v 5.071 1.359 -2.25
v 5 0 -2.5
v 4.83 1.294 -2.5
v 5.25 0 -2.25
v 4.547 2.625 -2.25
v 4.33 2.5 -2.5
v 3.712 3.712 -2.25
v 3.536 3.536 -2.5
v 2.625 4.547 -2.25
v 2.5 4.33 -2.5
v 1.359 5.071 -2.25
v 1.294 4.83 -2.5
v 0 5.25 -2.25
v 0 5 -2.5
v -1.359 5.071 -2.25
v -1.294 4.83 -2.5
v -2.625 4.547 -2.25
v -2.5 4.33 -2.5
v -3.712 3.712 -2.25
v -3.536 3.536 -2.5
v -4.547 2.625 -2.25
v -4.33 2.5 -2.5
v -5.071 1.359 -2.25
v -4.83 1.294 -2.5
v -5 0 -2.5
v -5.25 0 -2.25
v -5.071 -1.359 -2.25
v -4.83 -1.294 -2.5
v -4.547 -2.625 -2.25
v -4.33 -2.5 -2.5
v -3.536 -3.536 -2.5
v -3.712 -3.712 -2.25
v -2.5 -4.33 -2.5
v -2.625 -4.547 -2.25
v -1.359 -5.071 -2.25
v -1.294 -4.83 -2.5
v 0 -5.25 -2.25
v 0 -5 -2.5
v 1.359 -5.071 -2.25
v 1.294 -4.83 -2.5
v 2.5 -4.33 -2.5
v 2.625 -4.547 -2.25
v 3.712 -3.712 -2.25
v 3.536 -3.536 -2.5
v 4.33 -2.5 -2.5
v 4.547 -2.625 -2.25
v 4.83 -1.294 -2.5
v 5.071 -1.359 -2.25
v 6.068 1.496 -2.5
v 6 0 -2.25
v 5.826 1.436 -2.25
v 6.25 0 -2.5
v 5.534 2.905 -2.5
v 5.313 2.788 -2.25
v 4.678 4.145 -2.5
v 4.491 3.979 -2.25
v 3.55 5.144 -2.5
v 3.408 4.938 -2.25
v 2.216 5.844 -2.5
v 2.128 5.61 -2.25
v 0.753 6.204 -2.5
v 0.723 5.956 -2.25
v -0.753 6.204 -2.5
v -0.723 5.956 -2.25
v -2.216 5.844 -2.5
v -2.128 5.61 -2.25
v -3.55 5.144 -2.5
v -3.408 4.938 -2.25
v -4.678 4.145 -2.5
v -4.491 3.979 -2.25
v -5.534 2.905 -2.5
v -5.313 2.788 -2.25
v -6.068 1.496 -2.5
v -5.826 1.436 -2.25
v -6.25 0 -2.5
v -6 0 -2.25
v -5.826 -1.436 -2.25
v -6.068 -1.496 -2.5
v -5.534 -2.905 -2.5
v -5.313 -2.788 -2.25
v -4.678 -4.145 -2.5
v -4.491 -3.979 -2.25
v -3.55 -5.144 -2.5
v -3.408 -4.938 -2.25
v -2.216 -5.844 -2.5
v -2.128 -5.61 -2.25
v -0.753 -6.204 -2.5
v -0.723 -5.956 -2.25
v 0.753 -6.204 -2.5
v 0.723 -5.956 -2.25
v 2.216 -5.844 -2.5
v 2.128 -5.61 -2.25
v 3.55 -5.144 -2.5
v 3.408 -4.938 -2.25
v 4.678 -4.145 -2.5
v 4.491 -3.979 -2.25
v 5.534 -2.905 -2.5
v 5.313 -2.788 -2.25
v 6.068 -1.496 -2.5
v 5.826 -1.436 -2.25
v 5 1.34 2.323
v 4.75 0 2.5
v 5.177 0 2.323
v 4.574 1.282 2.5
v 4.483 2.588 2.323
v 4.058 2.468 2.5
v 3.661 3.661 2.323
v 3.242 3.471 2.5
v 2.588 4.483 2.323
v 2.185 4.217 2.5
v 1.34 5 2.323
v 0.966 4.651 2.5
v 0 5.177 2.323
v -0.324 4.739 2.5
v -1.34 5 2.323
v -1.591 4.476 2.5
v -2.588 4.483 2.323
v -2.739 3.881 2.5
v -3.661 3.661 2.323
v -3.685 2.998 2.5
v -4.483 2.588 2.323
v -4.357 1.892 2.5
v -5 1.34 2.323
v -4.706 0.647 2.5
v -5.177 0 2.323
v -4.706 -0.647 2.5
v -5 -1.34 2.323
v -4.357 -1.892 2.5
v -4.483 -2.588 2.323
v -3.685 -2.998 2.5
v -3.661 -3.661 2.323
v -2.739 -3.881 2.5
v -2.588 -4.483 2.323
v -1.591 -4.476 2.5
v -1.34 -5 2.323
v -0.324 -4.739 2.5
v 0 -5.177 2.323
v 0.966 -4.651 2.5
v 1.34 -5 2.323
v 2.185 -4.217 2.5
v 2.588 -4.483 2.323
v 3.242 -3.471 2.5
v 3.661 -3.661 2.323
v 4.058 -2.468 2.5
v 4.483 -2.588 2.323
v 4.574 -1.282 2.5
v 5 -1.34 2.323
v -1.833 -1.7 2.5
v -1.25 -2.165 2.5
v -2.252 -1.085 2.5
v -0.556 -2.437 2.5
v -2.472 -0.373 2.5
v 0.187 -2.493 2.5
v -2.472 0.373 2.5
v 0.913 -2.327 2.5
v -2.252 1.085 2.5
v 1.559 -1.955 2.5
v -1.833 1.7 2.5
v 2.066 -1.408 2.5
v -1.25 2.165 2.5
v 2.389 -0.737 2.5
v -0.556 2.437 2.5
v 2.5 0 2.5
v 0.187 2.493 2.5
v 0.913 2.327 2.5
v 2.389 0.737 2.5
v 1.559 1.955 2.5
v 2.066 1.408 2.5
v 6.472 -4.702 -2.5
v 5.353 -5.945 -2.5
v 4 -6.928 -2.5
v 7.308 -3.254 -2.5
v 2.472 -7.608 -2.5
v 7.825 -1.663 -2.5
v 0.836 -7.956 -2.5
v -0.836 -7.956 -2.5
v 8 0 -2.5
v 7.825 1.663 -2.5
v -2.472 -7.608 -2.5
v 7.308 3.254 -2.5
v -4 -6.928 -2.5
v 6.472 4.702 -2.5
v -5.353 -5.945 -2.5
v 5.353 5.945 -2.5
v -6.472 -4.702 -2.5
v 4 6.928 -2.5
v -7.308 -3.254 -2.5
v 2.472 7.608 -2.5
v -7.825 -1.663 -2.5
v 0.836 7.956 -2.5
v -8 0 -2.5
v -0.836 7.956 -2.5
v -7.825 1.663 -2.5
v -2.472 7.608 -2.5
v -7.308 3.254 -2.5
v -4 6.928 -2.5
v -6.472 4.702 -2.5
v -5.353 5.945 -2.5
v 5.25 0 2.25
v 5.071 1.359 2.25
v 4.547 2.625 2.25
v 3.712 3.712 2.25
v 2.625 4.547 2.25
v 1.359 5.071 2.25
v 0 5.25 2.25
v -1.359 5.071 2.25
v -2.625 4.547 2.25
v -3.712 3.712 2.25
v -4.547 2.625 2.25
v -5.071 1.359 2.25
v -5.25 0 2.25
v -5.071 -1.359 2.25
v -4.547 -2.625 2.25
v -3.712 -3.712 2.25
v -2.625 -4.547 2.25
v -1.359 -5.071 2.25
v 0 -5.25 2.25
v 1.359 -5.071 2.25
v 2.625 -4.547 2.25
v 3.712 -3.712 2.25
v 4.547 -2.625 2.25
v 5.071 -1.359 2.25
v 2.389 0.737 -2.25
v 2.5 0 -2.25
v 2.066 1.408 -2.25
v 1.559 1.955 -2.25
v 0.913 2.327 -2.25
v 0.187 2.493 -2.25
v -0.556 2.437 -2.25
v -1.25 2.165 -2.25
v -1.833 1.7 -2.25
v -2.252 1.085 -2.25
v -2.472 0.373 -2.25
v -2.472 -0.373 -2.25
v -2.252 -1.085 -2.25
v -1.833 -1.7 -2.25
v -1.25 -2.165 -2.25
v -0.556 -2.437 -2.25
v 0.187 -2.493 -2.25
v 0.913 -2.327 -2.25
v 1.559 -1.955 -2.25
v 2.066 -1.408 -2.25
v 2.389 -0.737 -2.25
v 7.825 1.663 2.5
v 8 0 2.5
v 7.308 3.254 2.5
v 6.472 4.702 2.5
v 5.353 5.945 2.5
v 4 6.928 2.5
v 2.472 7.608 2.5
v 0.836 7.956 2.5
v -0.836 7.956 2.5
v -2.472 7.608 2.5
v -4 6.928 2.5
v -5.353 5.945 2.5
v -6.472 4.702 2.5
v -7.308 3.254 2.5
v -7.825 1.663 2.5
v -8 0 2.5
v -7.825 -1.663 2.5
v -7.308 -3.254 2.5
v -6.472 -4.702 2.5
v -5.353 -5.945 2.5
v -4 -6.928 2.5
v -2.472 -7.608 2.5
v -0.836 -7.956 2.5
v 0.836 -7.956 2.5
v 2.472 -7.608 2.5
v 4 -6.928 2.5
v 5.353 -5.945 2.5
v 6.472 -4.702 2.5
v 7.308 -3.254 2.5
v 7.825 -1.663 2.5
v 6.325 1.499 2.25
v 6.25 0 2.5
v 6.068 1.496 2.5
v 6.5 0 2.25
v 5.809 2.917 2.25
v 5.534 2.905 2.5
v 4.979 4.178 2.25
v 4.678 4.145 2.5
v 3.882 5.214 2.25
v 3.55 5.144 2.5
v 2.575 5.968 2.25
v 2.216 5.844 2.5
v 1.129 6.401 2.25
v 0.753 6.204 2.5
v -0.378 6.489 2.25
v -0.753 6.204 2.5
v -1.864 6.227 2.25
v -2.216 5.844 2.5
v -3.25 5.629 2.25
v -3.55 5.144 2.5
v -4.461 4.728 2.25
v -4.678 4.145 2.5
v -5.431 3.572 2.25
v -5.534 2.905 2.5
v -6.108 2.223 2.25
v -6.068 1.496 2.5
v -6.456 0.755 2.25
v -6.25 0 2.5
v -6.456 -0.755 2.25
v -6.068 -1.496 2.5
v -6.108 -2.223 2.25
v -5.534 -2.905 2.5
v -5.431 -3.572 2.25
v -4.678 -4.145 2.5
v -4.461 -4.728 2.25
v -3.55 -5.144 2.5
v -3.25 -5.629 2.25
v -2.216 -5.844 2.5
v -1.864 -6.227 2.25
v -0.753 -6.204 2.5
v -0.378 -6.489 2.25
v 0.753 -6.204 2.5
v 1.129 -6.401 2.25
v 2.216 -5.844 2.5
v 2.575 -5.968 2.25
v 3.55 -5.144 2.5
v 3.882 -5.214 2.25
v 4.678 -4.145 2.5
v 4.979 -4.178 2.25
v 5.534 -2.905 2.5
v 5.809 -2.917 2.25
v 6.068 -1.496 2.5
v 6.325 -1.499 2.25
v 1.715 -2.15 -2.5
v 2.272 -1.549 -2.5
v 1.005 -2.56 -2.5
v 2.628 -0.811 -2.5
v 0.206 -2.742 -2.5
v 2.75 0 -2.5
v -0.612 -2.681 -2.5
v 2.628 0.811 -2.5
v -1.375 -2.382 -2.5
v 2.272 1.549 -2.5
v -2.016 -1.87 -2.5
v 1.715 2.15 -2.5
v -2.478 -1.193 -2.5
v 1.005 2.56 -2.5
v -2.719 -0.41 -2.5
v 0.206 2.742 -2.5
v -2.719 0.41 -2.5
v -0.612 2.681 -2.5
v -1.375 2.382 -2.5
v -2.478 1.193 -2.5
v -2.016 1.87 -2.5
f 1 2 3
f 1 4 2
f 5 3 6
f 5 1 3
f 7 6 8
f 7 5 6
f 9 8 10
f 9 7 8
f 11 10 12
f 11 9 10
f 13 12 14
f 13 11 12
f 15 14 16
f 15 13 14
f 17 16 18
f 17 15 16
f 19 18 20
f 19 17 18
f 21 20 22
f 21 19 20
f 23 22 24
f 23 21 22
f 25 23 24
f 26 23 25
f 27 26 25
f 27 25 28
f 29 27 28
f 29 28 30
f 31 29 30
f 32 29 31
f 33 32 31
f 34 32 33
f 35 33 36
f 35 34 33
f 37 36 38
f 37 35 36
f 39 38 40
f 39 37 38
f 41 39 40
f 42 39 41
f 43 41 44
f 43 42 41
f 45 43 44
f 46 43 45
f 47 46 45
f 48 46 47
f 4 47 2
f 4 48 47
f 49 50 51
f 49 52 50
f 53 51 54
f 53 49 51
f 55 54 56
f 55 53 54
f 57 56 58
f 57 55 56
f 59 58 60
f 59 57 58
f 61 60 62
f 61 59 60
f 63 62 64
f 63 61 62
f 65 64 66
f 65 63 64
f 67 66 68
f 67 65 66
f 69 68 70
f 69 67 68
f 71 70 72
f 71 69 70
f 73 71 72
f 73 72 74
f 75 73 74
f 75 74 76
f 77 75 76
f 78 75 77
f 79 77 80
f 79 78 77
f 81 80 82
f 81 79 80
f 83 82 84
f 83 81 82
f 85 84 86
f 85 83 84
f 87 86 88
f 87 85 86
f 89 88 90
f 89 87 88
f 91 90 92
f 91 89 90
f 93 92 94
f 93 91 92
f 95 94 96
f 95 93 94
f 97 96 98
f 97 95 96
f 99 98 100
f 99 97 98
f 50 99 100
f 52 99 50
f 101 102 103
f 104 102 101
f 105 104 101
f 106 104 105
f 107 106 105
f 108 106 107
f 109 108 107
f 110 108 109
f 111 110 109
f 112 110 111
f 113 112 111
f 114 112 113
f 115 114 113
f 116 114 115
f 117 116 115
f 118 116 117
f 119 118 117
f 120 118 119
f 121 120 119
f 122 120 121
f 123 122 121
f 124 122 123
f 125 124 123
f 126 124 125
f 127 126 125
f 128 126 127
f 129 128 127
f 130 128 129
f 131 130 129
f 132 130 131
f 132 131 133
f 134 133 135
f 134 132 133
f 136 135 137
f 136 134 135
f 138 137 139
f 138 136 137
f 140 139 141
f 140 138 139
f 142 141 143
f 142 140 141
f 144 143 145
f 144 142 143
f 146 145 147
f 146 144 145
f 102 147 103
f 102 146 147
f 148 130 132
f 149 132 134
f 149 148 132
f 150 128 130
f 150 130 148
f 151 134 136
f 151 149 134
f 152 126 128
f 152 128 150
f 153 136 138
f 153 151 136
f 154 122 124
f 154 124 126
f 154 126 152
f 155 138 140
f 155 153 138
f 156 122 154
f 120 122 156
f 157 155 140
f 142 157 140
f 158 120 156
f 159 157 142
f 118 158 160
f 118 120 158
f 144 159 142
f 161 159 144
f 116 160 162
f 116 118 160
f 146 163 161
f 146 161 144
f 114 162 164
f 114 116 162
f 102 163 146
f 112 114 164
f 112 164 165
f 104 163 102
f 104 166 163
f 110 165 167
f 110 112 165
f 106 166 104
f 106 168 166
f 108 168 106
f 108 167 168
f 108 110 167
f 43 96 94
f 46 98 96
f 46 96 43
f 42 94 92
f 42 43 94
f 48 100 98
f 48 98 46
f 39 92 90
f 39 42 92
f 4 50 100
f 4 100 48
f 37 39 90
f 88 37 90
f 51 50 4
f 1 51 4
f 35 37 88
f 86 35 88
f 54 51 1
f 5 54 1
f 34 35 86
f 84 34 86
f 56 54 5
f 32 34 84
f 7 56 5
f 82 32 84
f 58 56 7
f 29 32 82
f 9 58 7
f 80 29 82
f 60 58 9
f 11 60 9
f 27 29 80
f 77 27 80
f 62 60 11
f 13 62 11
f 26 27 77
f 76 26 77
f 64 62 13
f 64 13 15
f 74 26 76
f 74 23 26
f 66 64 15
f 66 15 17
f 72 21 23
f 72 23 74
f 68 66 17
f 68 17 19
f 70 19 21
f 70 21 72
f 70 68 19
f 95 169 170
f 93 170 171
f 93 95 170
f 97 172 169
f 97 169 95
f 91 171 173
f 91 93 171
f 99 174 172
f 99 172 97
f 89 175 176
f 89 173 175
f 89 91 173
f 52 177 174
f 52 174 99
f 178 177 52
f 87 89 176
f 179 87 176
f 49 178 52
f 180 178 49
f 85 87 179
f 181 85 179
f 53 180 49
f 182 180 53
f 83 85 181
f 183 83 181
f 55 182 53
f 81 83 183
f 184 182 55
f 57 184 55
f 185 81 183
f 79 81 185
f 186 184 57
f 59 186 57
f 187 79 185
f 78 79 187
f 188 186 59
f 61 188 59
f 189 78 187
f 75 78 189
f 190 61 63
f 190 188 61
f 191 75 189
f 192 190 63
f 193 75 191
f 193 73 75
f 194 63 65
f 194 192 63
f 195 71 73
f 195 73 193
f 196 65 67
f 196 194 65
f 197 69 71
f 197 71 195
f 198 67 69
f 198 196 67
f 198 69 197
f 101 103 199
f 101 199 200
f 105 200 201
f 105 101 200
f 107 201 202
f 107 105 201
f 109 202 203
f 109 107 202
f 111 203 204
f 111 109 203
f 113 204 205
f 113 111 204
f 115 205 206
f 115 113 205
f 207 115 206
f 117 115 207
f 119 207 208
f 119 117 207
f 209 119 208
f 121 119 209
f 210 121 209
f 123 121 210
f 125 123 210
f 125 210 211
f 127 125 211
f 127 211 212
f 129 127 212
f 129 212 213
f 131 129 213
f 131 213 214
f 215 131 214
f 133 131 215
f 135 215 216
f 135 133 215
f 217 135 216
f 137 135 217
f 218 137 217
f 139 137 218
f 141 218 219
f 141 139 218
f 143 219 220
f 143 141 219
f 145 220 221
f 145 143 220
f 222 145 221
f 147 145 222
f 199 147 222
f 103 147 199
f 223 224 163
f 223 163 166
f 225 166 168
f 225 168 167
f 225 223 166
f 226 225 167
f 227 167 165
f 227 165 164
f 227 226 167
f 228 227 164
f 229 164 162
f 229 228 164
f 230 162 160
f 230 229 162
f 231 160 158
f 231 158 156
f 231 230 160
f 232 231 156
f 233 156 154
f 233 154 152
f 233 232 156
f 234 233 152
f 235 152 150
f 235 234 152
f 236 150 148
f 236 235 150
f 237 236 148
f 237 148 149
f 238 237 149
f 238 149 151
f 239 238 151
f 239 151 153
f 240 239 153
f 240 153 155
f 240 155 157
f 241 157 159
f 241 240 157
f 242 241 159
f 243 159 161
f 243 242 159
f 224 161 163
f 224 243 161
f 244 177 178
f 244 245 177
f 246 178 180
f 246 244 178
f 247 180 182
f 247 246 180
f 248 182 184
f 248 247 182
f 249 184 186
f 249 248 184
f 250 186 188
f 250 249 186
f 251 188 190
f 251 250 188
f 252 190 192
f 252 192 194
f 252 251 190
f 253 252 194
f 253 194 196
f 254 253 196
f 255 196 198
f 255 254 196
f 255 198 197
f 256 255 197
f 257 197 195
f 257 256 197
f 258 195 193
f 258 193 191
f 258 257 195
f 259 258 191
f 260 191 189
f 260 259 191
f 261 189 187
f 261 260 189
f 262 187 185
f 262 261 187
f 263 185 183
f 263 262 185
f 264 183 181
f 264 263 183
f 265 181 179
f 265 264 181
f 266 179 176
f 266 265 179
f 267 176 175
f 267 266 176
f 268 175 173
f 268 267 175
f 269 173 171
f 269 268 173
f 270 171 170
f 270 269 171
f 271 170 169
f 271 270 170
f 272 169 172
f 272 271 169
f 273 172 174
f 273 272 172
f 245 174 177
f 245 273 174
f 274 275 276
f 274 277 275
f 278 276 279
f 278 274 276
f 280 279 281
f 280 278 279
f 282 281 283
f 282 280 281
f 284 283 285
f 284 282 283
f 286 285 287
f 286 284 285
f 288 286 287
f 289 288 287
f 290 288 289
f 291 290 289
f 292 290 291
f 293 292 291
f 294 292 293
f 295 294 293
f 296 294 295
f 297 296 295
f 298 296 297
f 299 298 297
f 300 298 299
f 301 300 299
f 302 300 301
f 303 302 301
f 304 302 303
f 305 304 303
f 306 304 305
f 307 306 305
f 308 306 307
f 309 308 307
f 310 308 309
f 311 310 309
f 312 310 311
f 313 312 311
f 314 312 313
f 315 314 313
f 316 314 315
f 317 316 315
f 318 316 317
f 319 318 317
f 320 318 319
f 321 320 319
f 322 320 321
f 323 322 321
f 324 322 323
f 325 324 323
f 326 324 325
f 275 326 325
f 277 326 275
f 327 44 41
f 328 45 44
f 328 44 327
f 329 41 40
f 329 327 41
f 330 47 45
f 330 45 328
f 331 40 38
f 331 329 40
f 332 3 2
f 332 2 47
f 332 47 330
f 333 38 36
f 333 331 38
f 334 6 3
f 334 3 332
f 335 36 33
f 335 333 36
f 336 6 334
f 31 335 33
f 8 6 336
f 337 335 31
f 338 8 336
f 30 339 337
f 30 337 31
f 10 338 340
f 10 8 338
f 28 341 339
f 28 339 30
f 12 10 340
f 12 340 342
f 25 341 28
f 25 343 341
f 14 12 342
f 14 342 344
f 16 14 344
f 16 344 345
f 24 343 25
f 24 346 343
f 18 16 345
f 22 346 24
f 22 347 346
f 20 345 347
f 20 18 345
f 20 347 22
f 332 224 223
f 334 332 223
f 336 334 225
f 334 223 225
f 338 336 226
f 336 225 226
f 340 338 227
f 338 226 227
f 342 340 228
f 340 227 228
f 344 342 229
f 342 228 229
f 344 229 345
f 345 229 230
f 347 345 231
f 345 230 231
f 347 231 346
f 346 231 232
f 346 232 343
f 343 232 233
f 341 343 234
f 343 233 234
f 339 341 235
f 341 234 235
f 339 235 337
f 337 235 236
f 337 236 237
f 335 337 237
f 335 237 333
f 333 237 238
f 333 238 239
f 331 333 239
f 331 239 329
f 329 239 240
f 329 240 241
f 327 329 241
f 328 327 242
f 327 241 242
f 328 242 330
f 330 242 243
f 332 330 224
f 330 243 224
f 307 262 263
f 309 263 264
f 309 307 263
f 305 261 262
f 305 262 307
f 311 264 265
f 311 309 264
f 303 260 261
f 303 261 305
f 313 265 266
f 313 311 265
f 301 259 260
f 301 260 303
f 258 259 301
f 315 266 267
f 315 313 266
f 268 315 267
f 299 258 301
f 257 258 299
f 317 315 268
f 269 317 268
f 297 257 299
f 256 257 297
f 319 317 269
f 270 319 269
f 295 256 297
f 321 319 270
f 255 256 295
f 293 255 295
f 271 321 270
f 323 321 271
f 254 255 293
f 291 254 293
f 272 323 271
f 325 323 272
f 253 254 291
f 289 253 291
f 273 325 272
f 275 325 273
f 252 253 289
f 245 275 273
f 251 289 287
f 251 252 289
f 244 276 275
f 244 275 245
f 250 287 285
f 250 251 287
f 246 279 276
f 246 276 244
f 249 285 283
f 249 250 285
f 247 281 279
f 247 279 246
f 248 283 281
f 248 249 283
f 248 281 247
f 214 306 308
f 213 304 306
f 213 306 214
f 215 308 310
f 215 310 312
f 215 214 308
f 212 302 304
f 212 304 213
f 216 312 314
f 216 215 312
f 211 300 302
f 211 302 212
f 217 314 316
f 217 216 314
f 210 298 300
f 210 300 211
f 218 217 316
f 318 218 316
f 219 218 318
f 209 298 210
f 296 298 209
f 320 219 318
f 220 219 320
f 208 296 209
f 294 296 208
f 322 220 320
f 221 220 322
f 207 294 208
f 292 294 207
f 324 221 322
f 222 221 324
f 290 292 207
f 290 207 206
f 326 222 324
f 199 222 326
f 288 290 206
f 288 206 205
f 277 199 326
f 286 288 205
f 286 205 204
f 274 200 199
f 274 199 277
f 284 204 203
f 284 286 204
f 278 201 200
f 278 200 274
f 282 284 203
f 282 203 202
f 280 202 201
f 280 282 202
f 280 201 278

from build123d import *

# Parameters (mm, degrees)
CHAMFER_SIZE = 0.25


with BuildPart() as part:
    # Sketch → Revolution (revolve)
    with BuildSketch(Plane.XZ):
        Polygon((2.5, -2.5), (5, -2.5), (5.25, -2.25), (6, -2.25), (6.25, -2.5), (8, -2.5), (8, 2.5), (6.25, 2.5), (6.5, 2.25), (5.25, 2.25), (5, 2.5), (2.5, 2.5), align=None)
    revolve(axis=Axis((0, 0, 0), (0, 0, 1)))

    # Chamfer
    chamfer_edges = [part.edges().sort_by_distance(p)[0] for p in [
        (-5, 0, 2.5),
        (-2.5, 0, -2.5),
    ]]
    chamfer(chamfer_edges, length=CHAMFER_SIZE)


solid = part.part
